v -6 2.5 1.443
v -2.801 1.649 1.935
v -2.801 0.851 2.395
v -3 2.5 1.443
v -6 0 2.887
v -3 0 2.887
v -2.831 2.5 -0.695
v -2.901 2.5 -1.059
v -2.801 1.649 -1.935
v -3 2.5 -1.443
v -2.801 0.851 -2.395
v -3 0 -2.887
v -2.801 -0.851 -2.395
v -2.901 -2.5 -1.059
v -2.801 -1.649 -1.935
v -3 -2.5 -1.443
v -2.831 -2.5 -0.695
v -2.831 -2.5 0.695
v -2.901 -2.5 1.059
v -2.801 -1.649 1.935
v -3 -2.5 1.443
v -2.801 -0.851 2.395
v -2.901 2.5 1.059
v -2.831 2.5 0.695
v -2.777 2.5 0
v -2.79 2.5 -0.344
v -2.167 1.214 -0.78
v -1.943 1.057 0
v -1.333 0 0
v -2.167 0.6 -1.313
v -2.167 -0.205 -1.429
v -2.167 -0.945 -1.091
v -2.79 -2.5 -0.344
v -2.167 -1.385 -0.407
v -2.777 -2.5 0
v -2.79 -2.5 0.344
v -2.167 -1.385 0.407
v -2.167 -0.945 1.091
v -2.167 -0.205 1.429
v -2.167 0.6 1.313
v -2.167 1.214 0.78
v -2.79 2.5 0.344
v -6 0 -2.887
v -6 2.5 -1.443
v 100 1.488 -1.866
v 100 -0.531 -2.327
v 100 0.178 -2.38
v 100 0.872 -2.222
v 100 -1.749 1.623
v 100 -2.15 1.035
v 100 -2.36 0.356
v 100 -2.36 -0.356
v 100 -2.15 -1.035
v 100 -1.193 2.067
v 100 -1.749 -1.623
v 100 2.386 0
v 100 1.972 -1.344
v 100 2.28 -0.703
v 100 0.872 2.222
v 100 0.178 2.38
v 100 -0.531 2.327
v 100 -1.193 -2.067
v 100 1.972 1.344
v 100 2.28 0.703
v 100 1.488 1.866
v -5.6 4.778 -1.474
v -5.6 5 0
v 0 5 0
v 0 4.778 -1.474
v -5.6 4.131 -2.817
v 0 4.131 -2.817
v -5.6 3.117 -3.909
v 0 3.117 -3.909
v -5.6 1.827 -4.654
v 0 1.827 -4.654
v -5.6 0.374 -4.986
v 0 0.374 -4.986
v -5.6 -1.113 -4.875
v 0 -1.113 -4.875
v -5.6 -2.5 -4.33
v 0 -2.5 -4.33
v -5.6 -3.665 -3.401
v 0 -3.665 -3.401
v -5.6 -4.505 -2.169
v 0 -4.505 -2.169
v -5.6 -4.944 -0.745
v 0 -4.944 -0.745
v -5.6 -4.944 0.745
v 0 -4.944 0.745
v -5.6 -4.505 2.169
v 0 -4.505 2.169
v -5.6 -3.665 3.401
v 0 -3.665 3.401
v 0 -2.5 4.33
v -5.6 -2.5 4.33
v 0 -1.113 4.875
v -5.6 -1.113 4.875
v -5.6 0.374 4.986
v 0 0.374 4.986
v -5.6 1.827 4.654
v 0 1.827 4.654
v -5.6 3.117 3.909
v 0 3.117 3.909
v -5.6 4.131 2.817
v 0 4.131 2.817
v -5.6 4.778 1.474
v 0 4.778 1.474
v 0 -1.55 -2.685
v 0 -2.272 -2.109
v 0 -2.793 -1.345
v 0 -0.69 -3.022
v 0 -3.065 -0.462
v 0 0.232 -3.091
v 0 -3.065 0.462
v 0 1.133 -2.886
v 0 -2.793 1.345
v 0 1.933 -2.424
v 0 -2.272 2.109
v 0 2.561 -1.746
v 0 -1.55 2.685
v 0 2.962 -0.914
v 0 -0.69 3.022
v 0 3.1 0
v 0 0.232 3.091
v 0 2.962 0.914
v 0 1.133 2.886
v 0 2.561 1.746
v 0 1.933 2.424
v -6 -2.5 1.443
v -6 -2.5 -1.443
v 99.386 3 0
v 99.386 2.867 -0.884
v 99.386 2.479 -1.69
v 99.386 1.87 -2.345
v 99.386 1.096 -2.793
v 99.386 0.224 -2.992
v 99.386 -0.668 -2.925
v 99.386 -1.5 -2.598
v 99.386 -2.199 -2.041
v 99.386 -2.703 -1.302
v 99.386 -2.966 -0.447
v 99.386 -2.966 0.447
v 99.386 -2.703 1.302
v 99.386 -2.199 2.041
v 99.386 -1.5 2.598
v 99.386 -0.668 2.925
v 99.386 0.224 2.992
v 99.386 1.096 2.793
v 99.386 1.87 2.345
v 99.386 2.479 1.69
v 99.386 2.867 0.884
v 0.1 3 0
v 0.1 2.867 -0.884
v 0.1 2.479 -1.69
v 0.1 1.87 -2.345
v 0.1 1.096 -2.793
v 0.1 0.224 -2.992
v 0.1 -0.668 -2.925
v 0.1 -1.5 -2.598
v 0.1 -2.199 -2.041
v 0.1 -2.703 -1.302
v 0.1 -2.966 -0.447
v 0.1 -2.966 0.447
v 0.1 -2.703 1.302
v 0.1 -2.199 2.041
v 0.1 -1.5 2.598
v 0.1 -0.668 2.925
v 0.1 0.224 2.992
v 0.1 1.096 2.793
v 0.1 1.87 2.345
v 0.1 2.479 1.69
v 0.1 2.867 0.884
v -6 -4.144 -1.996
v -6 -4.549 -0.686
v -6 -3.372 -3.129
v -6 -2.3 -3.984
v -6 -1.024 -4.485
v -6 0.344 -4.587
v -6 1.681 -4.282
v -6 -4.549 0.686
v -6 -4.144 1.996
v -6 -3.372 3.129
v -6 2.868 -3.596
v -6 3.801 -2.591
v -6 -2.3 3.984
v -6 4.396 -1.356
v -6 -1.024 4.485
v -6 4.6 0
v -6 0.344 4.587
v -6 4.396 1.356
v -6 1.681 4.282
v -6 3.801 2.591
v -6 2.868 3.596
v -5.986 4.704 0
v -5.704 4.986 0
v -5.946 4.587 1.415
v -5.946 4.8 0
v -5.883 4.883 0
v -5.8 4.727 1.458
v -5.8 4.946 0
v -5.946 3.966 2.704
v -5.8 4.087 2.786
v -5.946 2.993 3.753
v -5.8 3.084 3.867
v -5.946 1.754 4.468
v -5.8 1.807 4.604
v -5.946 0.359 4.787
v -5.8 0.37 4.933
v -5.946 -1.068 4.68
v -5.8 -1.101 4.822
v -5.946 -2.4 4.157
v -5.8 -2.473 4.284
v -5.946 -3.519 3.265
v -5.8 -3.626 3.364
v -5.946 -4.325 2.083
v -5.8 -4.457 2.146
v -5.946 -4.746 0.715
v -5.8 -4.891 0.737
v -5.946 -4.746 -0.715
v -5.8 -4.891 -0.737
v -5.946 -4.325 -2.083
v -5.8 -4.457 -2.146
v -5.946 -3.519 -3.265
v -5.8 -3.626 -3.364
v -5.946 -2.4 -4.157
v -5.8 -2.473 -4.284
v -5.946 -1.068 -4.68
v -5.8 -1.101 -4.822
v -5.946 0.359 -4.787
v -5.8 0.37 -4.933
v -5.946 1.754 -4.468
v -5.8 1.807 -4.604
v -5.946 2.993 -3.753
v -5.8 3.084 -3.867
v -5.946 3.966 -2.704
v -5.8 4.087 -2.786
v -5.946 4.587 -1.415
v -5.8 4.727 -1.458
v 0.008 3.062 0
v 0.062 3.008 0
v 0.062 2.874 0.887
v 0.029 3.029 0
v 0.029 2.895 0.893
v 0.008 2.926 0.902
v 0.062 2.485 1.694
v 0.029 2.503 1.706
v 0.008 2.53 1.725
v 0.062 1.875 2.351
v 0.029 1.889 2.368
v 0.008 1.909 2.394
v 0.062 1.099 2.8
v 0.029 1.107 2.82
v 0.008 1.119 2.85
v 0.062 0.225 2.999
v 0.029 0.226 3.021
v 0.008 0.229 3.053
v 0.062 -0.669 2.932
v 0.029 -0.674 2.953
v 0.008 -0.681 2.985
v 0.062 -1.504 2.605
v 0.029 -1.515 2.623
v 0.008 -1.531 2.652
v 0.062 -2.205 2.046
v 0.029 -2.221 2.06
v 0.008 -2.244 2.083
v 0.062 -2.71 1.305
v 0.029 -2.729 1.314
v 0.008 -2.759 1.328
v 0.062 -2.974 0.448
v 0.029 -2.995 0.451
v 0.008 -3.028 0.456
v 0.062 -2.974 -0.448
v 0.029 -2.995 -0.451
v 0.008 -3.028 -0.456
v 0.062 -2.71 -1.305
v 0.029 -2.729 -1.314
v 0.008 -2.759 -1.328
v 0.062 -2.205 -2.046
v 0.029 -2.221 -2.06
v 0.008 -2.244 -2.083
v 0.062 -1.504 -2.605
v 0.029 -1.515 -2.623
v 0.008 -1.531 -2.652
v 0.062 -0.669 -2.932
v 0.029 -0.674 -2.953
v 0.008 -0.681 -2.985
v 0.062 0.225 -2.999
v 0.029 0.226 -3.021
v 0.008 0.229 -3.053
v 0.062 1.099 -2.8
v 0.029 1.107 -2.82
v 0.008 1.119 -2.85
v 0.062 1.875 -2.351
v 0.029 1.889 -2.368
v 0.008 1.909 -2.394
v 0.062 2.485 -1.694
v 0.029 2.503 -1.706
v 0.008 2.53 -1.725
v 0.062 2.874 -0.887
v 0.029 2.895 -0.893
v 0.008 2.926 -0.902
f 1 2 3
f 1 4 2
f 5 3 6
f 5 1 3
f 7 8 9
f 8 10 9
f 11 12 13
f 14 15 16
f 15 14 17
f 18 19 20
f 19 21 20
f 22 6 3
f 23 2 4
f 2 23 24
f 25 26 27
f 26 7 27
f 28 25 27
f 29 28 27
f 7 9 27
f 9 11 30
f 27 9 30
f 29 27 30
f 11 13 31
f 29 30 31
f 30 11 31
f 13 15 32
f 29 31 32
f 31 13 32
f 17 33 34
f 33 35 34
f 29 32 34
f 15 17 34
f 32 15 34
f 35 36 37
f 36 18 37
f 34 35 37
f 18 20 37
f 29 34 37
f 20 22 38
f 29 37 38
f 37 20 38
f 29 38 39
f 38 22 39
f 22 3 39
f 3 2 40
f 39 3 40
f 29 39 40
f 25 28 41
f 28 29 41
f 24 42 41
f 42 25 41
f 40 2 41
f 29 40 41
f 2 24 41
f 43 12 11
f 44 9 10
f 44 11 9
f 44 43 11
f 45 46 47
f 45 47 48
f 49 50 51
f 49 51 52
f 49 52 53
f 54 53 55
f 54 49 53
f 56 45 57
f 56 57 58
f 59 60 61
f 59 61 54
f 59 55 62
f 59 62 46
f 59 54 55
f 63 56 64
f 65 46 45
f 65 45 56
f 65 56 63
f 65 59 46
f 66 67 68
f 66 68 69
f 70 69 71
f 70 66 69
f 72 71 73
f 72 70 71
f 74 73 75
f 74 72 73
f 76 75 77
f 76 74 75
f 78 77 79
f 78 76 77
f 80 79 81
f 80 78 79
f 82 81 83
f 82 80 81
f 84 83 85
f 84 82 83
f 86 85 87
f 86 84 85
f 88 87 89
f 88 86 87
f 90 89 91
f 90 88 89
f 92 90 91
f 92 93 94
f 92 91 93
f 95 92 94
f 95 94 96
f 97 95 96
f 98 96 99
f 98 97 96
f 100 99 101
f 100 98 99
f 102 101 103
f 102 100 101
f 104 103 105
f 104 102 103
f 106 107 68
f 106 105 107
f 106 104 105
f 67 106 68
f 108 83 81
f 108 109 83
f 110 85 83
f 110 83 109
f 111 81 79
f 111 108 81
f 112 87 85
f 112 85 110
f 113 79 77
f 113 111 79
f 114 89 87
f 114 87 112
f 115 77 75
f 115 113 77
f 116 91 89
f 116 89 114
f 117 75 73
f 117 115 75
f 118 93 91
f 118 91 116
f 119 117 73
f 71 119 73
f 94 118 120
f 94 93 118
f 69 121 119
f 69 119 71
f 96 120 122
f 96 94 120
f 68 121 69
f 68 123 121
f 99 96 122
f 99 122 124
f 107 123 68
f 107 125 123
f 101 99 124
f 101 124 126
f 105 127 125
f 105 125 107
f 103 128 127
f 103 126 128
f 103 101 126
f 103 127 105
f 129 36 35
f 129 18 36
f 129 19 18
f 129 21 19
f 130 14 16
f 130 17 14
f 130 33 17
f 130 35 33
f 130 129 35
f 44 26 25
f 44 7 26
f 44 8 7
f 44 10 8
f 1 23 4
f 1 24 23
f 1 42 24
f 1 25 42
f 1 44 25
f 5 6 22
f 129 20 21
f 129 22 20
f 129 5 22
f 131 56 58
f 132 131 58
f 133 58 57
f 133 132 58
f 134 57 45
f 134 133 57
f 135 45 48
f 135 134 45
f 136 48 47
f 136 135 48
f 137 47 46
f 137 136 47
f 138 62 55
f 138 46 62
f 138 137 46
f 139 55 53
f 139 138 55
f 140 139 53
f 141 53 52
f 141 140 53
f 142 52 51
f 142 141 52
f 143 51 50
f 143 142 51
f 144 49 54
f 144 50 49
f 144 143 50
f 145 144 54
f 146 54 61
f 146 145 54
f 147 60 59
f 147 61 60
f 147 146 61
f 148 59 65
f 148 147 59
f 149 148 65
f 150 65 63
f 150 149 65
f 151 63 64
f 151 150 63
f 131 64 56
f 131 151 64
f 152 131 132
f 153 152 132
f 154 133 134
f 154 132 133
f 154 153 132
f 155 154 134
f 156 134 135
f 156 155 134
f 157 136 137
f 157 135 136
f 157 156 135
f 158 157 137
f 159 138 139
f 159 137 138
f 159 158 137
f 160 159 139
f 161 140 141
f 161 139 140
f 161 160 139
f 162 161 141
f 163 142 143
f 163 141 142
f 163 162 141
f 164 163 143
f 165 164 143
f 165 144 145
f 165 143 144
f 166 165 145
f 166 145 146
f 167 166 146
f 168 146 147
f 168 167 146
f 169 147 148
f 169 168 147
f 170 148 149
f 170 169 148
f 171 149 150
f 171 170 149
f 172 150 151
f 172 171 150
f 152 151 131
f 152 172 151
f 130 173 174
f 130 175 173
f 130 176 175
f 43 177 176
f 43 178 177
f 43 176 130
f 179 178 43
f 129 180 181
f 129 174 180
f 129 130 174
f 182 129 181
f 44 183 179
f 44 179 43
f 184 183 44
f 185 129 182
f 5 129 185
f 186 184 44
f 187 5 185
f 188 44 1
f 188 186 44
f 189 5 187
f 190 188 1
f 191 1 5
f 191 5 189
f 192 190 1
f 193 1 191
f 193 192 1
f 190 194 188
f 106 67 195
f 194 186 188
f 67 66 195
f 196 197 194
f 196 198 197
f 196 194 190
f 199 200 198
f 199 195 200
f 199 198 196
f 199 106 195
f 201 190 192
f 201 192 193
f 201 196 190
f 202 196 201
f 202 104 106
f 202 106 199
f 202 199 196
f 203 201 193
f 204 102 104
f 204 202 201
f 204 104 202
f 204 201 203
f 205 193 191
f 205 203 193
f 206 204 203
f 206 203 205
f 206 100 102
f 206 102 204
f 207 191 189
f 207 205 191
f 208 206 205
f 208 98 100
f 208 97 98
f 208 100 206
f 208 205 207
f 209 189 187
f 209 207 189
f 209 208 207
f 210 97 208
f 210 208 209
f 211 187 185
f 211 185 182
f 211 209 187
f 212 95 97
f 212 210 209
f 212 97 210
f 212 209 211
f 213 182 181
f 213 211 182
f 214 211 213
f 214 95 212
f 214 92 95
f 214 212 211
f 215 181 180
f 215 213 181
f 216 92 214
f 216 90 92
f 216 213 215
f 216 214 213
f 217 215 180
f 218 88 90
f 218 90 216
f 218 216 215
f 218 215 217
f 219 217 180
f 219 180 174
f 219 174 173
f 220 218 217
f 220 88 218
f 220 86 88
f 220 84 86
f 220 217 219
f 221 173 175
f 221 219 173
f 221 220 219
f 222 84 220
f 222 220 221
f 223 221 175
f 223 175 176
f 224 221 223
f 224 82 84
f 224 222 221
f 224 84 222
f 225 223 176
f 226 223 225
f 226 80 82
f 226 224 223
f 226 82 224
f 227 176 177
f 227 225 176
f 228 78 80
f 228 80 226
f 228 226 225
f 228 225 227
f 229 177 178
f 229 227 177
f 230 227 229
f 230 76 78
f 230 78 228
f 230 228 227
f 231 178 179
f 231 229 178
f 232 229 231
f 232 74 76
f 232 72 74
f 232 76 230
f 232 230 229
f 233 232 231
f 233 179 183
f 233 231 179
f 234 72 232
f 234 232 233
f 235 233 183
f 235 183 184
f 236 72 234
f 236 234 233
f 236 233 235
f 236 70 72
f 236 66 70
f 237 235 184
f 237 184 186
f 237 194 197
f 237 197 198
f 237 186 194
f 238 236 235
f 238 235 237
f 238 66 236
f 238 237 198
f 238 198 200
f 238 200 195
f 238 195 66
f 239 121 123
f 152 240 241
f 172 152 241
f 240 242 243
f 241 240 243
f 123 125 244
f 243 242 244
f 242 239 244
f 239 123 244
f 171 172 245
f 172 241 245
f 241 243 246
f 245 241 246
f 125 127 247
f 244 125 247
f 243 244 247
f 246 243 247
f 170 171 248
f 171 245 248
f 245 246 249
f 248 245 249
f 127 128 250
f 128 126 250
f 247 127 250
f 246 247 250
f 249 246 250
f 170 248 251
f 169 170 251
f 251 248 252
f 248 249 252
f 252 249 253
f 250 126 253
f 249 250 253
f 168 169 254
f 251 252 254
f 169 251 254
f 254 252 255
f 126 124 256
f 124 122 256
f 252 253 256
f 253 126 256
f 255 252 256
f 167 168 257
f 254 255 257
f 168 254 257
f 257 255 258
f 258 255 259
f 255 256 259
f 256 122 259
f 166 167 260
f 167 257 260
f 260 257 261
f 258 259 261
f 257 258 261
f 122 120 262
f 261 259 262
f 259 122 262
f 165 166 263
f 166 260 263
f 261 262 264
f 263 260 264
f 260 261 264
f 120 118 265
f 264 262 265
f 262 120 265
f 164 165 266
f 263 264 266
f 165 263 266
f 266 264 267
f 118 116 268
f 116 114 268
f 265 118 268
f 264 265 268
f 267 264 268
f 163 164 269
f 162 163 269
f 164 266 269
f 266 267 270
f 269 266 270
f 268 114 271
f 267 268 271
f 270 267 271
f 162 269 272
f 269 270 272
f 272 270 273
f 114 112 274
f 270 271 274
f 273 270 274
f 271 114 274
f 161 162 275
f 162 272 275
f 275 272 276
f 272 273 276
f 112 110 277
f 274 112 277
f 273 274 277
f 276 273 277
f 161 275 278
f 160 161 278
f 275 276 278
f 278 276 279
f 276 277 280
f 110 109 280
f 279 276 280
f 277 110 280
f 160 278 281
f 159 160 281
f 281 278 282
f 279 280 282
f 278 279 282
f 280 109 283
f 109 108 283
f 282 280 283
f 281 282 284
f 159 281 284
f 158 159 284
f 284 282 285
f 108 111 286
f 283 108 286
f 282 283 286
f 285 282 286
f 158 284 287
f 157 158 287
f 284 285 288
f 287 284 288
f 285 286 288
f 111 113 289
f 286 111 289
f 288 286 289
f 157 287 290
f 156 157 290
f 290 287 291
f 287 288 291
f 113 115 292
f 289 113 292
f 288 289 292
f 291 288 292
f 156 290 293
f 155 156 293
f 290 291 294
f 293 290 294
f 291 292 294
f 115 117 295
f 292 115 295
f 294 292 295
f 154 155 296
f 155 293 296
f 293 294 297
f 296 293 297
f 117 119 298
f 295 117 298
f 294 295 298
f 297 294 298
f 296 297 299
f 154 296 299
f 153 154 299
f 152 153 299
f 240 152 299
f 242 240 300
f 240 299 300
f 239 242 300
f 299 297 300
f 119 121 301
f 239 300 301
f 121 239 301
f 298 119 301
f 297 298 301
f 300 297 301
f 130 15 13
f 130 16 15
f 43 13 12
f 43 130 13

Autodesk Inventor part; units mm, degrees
ref_plane "YZ Plane" through (0, 0, 0) normal (1, 0, 0) x (0, 1, 0)
ref_plane "XZ Plane" through (0, 0, 0) normal (0, 1, 0) x (-1, 0, 0)
sketch "Sketch1" plane through (0, 0, 0) normal (0, 0, 1) x (1, 0, 0)
  line L0 (-1.3333, 0) -> (100, 0)
  line L1 (100, 0) -> (100, 3)
  line L2 (100, 3) -> (76, 3)
  line L3 (76, 3) -> (75.3865, 3)
  line L4 (75.3865, 3) -> (0, 3)
  line L5 (0, 3) -> (0, 5)
  line L6 (0, 5) -> (-6, 5)
  line L7 (-6, 5) -> (-6, 2.8868)
  line L8 (-6, 2.8868) -> (-3, 2.8868)
  line L9 (-3, 2.8868) -> (-1.3333, 0)
  line L10 (-27.2, 0) -> (121.2, 0) projected
  line L11 (0, -1) -> (0, 6) projected
  line L12 (76, 3) -> (0, 3) construction
  dimension "d1" = 24
  dimension "d2" = 0.6136
  dimension "d3" = 6
  dimension "d4" = 3
  dimension "d5" = 60
  dimension "d6" = 6
  dimension "d7" = 6
  dimension "d8" = 5.7735
  dimension "d9" = 10
  dimension "d26" = 100
revolve "Body" add sketch "Sketch1" angle 360 about axis through (-1.3333, 0, 0) along (1, 0, 0)
sketch "Sketch2" plane through (-6, 0, 0) normal (-1, 0, 0) x (0, 0, 1)
  circle A0 centre (0, 0) radius 2.8868 projected
  line L0 (0, -7) -> (0, 7) projected
  line L1 (-7, 0) -> (7, 0) projected
  line L2 (2.8868, 0) -> (1.4434, -2.5)
  line L3 (1.4434, -2.5) -> (-1.4434, -2.5)
  line L4 (-1.4434, -2.5) -> (-2.8868, 0)
  line L5 (-2.8868, 0) -> (-1.4434, 2.5)
  line L6 (-1.4434, 2.5) -> (1.4434, 2.5)
  line L7 (1.4434, 2.5) -> (2.8868, 0)
extrude "Slot" add sketch "Sketch2" against normal up to next contours L7 A0 | A0 L2 | L6 L0 A0 | A0 L0 L3 | L0 L6 A0 | A0 L3 L0 | L4 A0 | A0 L5
fillet "Fillet1" radius 0.4 1 edges at (-6, -5, 0)
thread "Thread" size "M6x1" class "6g" standard "ISO Metric profile" length 24
chamfer "Chamfer1" distance 0.6135 distance2 0.6135 1 edges at (100, -3, 0) measured on face at (100, -0.7776, 0.9024)
ref_plane "Work Plane1" through (29, 0, 0) normal (0, -1, 0) x (1, 0, 0)
fillet "Fillet2" radius 0.1 1 edges at (0, -3, 0)
equation "\"d1\" = GEL"
equation "\"d3\" = KOH"
equation "\"d4\" = INTI"
equation "\"d6\" = GD"
equation "\"d7\" = BDM"
equation "\"d8\" = 1.1547 * SW"
equation "\"d9\" = KOD"
equation "\"d26\" = NLG"
equation "\"d30\" = R"
equation "\"d17\" = RR"
equation "\"d13\" = GEL"
equation "\"d15\" = -0.5 * SPD + 0.5 * GD"
equation "\"d16\" = GUL"
equation "\"GD\" = NND"
equation "\"NLG\" = 100"
equation "\"GEL\" = 24"
equation "\"KOD\" = 10"
equation "\"KOH\" = NND"
equation "\"INTI\" = 3"
equation "\"GAL\" = 0.61345 * PTC"
equation "\"GUL\" = 0.61345 * PTC"
equation "\"BDM\" = NND"
equation "\"SW\" = 5"
equation "\"RR\" = 0.4"
equation "\"SPD\" = NND - 1.2269 * PTC"
equation "\"R\" = 0.1"
equation "\"PHH\" = 0.1 * NND"
equation "\"GD1\" = THREADDIA - 1.2269 * PTC"
equation "\"THREADDIA\" = 6"
equation "\"FAWI\" = 45deg"
equation "\"PTC\" = 1"
equation "\"NND\" = 6"
equation "\"FAWI1\" = 30deg"
equation "\"TOA\" = 30deg"
equation "\"E0\" = 1.155 * SW"
properties part number "Unbrako - M6 x 100" material "Steel, Mild"
